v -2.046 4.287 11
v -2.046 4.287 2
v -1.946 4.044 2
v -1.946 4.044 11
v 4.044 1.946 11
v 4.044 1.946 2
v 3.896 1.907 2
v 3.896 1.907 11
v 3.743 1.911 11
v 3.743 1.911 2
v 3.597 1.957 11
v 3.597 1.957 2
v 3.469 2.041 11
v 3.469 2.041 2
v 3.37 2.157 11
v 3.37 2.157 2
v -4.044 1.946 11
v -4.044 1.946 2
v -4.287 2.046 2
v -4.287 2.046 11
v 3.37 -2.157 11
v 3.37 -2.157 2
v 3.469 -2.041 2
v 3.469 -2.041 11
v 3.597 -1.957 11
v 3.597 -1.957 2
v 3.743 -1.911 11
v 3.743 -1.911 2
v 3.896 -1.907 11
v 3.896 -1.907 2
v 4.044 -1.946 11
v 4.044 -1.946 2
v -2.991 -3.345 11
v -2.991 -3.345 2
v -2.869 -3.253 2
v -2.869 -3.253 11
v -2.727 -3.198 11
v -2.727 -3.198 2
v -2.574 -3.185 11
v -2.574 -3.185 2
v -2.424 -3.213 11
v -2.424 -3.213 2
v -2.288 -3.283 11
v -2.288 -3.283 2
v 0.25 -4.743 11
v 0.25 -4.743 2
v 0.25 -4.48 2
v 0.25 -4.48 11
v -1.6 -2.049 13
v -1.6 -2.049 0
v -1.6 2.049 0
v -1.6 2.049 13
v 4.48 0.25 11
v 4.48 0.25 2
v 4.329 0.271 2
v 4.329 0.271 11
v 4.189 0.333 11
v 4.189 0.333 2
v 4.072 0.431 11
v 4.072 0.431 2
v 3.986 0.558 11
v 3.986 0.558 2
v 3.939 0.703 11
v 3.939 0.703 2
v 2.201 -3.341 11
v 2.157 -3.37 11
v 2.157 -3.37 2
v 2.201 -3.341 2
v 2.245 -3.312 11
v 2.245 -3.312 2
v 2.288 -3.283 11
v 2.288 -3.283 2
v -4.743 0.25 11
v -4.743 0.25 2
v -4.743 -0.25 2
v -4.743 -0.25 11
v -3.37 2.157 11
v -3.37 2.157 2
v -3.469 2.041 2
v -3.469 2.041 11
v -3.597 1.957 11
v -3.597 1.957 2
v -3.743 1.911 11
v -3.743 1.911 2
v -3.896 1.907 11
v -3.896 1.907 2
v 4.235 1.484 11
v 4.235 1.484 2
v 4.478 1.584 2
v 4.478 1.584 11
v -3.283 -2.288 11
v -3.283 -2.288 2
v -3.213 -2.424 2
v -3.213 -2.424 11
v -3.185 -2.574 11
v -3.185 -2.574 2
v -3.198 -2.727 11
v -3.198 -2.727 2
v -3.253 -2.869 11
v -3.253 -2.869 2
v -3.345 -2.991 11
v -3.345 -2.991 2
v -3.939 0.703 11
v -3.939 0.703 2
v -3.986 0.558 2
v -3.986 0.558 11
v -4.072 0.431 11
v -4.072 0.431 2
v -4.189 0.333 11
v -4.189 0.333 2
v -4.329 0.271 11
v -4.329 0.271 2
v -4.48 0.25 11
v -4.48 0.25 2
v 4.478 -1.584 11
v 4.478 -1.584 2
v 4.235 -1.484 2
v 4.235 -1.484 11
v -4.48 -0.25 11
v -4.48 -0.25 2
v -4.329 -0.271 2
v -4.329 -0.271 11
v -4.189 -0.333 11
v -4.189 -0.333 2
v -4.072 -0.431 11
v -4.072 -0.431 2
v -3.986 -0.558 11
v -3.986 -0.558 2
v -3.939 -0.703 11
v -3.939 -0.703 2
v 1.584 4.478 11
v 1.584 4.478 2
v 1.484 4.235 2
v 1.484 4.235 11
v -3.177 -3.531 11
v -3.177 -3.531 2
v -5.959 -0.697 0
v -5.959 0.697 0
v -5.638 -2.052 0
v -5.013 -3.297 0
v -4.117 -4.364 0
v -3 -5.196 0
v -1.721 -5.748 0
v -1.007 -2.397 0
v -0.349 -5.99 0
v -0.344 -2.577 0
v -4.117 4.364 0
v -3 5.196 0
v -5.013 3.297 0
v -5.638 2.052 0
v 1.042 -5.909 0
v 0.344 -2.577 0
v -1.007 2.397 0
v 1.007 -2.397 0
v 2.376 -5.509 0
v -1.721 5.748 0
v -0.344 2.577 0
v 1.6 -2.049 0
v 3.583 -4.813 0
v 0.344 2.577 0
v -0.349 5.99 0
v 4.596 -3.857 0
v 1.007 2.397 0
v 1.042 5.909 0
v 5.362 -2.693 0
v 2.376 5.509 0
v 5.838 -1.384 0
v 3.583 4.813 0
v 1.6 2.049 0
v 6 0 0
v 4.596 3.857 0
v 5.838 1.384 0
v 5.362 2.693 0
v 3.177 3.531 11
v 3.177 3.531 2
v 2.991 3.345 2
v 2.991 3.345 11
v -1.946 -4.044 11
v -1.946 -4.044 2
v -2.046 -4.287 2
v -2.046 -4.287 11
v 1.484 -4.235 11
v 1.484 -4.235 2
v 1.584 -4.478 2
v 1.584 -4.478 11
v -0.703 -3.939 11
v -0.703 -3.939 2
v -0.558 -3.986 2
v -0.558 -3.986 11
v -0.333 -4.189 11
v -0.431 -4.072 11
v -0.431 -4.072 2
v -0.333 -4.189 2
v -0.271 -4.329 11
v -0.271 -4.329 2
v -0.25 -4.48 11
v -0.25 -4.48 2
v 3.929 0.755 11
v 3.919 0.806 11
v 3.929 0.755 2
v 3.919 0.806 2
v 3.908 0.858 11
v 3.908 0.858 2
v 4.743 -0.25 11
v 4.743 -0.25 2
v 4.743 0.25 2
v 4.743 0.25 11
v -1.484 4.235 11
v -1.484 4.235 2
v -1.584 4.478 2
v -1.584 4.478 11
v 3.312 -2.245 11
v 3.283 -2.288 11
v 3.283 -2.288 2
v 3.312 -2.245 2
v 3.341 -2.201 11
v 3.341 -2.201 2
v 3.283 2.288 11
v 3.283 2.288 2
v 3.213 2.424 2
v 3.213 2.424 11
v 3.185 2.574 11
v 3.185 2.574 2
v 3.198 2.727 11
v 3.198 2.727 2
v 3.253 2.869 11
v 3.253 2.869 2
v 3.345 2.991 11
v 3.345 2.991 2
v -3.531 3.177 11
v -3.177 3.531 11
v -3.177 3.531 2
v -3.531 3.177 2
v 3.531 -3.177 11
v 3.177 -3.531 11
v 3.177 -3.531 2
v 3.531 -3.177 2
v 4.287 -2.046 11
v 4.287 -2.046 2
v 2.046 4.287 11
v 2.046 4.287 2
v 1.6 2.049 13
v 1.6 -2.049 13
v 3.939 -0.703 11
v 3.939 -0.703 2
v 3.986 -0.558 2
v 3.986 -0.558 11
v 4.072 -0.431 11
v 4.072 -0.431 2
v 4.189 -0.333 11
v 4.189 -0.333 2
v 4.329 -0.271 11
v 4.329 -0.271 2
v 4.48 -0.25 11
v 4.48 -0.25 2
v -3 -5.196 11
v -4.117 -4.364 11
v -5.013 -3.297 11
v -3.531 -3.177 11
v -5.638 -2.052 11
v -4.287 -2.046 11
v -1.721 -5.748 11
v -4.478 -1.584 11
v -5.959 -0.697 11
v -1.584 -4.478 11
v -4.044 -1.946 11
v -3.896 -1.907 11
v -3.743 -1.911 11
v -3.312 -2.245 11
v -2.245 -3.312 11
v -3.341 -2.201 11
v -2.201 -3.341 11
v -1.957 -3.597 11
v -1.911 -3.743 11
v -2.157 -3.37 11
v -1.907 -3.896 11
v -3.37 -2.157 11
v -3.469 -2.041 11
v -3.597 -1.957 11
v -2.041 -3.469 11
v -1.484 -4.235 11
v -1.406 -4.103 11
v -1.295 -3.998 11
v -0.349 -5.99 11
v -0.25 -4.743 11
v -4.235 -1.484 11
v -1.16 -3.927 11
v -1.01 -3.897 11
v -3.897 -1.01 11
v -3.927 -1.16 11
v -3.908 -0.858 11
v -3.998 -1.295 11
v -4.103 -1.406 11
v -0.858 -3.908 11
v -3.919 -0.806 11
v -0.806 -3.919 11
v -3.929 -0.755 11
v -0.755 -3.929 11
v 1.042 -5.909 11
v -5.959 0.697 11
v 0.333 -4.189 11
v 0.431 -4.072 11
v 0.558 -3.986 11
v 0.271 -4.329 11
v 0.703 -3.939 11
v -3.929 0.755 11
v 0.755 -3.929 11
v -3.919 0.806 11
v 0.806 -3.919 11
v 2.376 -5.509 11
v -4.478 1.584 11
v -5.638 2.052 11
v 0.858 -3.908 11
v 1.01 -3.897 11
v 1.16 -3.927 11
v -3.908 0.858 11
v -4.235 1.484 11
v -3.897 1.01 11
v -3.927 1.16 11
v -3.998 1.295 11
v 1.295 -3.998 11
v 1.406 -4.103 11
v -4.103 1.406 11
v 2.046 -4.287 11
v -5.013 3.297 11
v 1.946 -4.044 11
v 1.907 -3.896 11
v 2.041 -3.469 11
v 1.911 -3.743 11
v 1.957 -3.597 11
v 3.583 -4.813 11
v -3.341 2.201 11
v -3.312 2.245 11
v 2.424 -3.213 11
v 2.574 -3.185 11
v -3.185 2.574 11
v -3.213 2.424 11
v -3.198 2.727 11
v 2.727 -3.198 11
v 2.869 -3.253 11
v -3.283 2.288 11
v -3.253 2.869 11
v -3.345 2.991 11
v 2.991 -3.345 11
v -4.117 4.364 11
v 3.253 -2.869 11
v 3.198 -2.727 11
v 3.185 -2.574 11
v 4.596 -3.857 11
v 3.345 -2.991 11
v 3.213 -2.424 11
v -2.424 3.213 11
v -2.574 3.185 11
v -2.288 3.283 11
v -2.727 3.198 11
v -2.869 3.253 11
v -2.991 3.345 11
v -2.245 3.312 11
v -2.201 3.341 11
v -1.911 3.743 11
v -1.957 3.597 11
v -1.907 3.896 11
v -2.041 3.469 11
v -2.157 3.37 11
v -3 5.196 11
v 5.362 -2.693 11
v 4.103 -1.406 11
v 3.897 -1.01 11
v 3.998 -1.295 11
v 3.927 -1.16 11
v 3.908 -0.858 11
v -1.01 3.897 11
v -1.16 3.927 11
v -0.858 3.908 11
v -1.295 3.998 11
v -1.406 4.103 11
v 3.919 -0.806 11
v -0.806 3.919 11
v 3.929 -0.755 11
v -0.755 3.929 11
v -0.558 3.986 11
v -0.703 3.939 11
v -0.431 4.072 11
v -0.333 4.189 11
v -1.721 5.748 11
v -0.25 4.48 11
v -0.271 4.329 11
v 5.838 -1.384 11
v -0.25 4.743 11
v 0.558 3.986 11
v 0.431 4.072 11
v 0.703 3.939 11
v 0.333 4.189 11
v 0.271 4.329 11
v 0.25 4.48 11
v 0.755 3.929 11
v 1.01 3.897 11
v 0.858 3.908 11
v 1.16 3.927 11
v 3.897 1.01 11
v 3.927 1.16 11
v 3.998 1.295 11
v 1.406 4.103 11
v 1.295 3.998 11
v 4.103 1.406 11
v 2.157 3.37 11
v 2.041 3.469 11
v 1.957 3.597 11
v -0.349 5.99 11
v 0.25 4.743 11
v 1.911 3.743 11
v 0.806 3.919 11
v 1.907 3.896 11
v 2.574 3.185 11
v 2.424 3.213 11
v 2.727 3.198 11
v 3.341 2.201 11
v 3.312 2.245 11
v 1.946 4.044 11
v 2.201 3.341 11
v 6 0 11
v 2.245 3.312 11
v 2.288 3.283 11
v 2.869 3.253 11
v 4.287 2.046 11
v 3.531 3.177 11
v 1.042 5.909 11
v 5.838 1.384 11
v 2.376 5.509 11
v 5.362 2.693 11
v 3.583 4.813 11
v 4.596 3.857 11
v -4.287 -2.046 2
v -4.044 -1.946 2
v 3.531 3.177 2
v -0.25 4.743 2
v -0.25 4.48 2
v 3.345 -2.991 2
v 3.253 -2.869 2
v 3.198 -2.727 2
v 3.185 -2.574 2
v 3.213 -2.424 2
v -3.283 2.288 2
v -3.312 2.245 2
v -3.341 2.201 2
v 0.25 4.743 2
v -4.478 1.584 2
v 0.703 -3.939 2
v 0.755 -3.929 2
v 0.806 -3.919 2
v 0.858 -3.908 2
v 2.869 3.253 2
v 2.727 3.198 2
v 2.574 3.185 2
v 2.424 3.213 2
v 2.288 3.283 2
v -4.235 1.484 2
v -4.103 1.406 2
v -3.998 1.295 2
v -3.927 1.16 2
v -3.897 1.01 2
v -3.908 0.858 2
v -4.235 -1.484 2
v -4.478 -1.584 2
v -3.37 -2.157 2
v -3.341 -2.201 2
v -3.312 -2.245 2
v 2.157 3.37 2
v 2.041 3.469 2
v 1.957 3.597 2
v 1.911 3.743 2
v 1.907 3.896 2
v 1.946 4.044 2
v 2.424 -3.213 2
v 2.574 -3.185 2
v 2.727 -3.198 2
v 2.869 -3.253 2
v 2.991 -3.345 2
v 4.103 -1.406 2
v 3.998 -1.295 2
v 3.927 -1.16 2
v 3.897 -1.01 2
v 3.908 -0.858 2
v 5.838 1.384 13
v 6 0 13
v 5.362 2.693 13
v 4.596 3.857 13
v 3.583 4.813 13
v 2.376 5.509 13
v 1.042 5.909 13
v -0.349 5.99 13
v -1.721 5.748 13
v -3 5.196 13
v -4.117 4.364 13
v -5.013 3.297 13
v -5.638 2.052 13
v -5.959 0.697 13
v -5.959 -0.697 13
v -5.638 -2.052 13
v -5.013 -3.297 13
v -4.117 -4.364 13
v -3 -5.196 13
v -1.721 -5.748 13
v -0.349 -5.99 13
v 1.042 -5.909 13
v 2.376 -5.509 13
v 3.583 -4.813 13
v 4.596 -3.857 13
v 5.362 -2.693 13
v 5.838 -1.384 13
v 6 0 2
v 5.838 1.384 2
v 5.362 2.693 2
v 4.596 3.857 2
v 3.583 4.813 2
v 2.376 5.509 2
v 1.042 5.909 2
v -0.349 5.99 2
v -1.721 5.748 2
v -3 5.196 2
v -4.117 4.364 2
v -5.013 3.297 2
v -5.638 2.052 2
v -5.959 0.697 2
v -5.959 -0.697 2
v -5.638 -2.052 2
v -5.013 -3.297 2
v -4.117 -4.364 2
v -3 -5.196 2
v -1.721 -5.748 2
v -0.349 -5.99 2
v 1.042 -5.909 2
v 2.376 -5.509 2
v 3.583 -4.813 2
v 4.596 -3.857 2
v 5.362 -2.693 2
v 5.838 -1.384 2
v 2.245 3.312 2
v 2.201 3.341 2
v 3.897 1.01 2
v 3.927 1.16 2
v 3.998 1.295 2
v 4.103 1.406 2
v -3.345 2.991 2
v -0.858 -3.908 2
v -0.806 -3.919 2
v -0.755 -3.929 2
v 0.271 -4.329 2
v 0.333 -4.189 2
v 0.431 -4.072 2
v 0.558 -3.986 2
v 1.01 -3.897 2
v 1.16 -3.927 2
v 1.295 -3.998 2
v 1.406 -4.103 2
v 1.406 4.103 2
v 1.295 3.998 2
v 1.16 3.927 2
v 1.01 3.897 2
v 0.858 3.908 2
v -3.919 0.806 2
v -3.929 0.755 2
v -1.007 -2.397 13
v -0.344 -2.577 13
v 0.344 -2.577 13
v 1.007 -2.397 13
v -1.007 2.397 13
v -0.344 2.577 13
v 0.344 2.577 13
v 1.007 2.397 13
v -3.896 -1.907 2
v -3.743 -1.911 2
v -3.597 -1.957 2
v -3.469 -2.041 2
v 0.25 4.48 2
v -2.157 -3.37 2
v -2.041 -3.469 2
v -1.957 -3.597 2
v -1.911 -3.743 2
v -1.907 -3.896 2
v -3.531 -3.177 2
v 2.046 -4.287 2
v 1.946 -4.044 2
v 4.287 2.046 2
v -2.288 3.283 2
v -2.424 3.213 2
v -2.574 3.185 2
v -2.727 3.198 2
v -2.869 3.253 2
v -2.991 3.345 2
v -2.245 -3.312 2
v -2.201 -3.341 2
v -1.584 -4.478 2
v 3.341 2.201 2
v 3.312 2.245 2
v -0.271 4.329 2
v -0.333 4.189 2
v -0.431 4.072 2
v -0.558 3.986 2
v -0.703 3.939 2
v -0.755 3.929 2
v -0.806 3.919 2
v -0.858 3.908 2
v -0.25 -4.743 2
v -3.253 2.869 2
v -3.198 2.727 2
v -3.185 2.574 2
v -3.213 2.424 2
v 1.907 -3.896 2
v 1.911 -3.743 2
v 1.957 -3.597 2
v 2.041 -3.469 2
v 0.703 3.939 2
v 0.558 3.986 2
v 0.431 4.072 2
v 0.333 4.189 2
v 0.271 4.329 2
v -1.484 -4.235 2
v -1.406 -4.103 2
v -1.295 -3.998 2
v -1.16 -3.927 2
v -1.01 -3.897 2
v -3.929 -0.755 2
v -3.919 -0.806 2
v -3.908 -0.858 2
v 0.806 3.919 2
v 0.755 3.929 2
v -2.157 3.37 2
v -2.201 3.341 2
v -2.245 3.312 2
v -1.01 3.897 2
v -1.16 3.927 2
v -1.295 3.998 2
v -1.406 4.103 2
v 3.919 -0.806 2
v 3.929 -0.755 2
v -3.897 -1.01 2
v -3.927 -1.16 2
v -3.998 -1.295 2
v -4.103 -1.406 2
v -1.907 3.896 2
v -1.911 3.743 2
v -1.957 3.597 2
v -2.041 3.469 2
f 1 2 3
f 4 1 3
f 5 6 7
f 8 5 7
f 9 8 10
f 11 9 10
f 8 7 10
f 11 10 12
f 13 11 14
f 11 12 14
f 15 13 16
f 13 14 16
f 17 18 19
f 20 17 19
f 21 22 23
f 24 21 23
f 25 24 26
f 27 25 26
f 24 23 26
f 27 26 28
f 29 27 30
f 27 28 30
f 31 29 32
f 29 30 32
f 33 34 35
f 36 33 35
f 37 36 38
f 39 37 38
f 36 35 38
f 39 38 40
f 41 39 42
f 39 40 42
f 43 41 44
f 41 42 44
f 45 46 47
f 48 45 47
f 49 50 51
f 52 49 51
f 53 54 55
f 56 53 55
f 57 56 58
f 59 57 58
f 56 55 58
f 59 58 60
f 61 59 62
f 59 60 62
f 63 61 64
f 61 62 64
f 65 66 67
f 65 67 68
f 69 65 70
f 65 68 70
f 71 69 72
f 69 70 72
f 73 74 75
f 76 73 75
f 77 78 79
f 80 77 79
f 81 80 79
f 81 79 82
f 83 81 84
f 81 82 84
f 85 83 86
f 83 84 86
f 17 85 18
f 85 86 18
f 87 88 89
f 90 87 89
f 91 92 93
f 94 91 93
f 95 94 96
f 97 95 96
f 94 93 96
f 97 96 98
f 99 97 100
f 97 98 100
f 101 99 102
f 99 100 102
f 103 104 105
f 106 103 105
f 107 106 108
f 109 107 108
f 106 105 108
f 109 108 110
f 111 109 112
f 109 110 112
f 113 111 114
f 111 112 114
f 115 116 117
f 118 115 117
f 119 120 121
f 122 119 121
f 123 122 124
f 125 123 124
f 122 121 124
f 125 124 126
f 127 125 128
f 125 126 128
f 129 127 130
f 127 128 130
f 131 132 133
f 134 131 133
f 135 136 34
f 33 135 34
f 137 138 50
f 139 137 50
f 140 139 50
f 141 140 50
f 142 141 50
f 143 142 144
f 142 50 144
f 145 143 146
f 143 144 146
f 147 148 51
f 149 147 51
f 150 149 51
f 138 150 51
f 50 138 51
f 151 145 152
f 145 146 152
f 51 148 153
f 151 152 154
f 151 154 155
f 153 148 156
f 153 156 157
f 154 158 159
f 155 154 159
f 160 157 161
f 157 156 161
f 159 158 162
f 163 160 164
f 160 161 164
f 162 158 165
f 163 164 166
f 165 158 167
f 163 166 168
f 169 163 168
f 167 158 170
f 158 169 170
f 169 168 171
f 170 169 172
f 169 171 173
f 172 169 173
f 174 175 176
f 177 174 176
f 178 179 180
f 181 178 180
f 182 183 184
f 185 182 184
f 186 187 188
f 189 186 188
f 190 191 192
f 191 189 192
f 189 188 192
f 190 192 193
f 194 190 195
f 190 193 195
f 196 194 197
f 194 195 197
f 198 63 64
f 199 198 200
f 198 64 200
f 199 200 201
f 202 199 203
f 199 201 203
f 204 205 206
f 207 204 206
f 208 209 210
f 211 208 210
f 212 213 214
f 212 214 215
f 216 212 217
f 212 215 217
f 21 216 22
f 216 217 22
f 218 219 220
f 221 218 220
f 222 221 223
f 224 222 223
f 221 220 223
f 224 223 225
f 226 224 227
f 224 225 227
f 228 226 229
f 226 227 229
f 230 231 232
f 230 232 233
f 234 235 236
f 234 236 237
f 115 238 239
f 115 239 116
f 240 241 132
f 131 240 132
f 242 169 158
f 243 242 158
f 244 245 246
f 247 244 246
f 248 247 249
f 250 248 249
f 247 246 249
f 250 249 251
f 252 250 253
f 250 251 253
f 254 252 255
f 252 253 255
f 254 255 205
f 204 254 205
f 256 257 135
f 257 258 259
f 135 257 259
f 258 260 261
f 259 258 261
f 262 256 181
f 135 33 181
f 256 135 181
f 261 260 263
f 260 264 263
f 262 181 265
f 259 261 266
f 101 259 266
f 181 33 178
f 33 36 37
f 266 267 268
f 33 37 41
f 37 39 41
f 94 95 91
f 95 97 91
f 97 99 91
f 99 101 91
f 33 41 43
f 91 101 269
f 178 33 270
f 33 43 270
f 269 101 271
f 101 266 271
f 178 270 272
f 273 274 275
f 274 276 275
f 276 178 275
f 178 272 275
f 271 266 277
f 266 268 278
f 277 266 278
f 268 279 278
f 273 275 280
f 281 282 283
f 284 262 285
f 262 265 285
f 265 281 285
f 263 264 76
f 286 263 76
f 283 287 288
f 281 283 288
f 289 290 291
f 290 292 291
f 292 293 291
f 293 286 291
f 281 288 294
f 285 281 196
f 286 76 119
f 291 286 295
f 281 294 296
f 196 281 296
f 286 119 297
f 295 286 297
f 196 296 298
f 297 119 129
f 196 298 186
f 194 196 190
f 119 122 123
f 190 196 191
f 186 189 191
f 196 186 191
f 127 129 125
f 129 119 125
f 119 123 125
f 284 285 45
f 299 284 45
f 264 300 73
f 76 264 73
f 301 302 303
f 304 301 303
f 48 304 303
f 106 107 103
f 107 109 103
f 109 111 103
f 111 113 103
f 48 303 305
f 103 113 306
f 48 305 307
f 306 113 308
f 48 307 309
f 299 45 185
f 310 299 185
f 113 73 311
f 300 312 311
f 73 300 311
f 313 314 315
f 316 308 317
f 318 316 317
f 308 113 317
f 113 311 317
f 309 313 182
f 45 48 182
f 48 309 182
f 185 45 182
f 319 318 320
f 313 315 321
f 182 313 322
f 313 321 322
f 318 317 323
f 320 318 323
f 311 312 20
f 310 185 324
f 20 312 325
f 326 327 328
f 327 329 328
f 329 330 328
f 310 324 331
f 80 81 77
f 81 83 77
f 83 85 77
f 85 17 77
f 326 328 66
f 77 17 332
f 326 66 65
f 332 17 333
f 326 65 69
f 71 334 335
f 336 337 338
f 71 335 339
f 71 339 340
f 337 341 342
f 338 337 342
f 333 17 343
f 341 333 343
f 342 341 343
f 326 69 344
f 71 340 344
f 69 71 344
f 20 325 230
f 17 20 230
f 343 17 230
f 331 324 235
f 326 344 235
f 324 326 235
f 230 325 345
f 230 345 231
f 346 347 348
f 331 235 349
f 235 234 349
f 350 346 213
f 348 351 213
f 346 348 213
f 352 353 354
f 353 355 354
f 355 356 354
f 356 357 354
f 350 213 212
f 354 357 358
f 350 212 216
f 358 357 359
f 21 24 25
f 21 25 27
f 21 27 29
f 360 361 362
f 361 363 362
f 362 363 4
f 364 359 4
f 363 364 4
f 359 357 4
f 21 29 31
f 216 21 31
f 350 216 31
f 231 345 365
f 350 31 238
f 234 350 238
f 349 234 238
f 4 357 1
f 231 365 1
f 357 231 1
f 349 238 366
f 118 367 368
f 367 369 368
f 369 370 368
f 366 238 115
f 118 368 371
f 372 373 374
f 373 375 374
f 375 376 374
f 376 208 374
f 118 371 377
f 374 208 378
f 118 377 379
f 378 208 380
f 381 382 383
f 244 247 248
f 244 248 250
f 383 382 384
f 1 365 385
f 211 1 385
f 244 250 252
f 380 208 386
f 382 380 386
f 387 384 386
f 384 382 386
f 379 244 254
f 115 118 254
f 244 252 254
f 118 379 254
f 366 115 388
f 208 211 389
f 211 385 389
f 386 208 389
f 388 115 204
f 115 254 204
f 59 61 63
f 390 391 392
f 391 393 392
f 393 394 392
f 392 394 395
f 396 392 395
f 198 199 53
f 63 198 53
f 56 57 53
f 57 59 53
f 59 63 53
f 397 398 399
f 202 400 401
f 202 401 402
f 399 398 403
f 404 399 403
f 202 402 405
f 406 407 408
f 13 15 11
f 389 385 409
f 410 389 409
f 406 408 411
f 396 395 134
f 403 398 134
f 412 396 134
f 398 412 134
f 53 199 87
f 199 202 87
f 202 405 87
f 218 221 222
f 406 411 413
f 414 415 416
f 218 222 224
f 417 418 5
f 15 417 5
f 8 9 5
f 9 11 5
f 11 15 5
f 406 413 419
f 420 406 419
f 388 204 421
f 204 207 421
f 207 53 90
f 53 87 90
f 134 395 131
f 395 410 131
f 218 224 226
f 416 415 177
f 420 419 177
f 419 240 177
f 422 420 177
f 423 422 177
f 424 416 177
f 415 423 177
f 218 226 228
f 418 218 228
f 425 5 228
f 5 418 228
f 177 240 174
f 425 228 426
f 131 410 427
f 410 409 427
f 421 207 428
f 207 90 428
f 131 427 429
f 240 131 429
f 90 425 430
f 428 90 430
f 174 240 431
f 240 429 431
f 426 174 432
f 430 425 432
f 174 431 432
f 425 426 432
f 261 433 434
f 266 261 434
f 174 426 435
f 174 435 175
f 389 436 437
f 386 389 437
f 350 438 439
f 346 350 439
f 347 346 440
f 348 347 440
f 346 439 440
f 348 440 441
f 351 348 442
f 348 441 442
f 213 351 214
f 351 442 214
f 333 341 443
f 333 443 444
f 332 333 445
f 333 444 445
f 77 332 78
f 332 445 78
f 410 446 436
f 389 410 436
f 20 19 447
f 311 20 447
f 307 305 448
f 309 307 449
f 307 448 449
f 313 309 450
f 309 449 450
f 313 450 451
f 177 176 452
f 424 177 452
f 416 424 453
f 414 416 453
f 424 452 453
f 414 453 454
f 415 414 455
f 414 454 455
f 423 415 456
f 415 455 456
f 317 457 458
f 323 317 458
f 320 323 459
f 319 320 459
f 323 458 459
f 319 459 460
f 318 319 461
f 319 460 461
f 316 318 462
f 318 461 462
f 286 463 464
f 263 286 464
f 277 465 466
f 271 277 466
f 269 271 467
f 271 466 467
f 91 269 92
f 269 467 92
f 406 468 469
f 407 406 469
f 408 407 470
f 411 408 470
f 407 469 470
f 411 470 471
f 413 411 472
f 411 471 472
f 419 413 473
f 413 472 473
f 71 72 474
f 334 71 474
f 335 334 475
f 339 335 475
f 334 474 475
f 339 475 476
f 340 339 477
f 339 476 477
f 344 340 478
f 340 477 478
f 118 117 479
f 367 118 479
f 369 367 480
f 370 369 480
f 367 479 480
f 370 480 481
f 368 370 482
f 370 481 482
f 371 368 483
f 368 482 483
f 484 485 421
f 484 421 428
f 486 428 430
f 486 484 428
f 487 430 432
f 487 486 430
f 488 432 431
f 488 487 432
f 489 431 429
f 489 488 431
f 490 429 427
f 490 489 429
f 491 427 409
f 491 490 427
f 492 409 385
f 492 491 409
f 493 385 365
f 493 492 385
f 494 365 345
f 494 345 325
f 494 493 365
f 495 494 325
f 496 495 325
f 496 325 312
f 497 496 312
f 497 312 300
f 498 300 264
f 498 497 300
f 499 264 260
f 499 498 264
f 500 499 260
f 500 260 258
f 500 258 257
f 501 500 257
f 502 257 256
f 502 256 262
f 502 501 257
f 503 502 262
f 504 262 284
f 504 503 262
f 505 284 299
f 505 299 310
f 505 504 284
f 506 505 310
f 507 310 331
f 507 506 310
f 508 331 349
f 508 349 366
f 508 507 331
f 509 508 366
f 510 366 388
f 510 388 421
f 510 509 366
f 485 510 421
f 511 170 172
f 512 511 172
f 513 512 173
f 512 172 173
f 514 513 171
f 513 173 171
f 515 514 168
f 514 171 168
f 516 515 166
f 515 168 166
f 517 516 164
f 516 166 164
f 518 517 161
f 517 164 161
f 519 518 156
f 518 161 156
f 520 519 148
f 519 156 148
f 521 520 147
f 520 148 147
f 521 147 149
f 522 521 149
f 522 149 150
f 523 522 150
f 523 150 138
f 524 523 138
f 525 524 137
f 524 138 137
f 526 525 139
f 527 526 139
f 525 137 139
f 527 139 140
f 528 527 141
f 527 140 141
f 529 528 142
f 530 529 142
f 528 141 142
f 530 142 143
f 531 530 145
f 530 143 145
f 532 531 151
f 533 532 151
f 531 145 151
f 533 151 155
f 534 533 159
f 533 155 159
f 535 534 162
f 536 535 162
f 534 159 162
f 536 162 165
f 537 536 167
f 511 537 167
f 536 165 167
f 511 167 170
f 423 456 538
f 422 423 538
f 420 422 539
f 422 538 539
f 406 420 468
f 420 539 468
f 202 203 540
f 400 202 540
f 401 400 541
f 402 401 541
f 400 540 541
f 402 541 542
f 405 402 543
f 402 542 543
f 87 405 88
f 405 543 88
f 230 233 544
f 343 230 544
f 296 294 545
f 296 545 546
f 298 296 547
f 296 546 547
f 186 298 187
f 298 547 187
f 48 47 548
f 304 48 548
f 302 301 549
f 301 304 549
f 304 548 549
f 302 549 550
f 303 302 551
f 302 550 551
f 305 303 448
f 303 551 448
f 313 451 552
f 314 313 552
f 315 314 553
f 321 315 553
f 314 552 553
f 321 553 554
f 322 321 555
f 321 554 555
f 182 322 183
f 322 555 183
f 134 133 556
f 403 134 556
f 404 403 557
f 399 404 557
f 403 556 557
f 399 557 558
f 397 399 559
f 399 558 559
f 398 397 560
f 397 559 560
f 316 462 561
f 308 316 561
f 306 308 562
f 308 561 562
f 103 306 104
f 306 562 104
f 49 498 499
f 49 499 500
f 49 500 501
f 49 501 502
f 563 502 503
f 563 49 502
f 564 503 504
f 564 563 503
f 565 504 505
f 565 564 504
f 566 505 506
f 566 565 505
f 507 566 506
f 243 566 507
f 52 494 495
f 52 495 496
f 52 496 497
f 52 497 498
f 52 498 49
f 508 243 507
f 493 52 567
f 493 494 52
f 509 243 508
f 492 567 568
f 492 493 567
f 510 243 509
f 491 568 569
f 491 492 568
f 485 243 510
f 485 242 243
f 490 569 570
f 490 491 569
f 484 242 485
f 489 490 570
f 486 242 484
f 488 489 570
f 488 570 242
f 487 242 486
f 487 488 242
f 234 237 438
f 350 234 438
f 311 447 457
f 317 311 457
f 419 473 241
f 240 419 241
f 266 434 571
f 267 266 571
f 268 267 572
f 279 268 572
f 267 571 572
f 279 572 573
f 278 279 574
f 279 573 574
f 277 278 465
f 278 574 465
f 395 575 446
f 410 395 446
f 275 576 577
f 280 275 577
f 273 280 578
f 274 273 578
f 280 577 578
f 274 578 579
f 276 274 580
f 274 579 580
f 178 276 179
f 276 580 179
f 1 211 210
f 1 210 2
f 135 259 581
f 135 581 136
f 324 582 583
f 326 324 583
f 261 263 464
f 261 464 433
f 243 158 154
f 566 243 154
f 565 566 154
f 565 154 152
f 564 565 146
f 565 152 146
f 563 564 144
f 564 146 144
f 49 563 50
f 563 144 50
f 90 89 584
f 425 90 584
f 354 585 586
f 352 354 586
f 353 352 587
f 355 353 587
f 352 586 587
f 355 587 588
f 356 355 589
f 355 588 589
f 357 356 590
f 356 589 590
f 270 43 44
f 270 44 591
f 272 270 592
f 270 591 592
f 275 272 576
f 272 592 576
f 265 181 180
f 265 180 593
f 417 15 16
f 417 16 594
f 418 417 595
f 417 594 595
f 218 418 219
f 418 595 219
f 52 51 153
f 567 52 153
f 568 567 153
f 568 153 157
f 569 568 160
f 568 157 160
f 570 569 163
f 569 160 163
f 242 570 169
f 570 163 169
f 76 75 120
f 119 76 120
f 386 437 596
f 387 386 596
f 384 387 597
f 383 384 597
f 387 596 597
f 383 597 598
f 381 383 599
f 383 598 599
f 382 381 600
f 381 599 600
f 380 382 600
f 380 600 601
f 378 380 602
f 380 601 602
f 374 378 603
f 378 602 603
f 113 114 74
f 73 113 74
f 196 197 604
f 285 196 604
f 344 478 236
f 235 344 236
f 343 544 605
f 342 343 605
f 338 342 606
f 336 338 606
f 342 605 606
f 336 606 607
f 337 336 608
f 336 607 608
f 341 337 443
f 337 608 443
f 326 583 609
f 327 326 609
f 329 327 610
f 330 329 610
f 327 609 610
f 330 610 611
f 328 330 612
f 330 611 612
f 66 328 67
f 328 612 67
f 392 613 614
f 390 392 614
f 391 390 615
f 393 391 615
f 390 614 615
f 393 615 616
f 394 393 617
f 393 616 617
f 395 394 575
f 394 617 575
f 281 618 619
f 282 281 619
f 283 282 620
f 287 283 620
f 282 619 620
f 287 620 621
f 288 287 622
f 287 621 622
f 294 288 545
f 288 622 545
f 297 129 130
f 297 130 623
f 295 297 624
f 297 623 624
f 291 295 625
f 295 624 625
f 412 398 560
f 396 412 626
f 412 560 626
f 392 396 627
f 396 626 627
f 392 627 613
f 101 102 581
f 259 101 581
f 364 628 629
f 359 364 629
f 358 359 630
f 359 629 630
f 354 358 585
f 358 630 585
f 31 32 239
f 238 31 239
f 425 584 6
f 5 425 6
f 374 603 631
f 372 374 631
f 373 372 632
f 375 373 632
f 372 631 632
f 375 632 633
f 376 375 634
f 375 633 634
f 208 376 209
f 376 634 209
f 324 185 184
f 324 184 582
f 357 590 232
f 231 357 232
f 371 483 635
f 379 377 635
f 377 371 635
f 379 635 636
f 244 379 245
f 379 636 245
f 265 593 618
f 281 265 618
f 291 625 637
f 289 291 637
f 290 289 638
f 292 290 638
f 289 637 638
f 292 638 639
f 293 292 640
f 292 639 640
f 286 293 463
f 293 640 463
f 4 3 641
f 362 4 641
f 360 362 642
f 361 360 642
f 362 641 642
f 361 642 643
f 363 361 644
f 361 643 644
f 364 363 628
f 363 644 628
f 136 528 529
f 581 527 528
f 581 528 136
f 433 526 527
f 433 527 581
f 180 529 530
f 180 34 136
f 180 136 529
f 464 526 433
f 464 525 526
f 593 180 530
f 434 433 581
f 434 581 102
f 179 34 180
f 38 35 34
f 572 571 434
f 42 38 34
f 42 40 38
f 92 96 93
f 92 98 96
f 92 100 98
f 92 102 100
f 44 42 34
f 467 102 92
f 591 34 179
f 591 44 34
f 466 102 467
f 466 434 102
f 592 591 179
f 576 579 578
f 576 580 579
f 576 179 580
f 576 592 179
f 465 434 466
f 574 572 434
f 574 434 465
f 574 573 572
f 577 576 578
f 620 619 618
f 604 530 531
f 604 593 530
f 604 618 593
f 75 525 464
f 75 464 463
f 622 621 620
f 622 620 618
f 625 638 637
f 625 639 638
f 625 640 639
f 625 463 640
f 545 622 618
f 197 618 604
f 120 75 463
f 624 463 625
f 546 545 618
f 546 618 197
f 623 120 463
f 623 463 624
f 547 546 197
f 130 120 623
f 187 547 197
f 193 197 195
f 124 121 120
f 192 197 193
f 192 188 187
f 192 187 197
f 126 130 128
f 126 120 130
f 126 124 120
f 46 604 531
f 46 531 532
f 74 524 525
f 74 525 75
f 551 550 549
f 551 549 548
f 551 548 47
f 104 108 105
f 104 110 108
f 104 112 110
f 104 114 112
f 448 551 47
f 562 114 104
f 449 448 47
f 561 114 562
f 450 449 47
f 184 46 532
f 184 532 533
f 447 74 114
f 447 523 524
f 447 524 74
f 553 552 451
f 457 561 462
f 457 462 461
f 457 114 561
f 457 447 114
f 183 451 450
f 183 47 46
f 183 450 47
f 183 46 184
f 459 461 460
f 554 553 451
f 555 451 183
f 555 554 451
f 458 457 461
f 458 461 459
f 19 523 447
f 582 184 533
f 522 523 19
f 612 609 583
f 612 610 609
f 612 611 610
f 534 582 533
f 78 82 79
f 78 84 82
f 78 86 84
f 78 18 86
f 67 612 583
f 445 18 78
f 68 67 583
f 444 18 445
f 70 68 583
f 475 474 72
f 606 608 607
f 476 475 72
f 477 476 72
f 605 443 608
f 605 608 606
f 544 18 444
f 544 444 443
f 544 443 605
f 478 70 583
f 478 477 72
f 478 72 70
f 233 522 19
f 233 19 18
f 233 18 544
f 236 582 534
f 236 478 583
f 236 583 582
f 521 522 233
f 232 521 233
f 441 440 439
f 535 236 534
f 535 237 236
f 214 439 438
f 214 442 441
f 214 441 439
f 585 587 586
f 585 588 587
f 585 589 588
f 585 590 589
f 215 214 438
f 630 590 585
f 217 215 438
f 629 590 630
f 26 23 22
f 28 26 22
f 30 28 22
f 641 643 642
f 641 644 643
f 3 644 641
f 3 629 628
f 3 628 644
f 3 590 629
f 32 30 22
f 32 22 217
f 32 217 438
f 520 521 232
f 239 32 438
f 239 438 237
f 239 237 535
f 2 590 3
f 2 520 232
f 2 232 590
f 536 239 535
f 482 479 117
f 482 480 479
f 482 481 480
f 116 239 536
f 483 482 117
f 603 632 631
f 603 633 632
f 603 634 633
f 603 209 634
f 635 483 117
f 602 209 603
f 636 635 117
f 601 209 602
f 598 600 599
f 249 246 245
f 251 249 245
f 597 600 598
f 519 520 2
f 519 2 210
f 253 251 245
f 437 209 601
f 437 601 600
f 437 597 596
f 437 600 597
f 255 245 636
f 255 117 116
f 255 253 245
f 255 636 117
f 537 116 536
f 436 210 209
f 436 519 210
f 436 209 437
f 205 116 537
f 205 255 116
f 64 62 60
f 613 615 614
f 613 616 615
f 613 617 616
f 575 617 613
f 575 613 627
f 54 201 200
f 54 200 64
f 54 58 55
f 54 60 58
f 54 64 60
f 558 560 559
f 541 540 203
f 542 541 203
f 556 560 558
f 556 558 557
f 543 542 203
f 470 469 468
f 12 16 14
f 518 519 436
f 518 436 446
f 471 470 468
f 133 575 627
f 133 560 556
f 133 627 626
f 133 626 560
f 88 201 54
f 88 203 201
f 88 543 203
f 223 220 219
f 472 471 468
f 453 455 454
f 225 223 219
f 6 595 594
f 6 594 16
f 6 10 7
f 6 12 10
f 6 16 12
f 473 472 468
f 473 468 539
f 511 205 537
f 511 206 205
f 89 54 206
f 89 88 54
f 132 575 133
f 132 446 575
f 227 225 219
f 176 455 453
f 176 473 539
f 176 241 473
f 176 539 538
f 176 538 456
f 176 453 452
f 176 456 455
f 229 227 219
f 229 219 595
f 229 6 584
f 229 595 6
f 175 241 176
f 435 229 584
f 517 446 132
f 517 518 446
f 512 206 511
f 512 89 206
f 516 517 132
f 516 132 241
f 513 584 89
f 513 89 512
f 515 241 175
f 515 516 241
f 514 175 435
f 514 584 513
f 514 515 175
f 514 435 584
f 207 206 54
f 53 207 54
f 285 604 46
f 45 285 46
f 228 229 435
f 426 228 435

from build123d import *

# Parameters (mm, degrees)
F2_DEPTH        = 13
F1_R            = 6
F3_DEPTH        = 2
F4_DEPTH        = 13
F4_COPIES_COUNT = 16


# Not quite as in the source:
# - a pattern or mirror of a feature is missing from the dataset's text; its kind, count and spacing are read off the source's solid


with BuildPart() as f2:
    # F1 (on Top) → F2 (new body)
    with BuildSketch(Plane.XY):
        with BuildLine():
            ThreePointArc((-0.7033229276, -3.9389354049), (-0.4774392089, -3.9726473625), (-0.25, -3.9934164903))
            Line((-0.25, -3.9934164903), (0.25, -3.9934164903))
            Line((0.25, -3.9934164903), (0.7033229276, -3.9389354049))
            ThreePointArc((0.7033229276, -3.9389354049), (0, 4.0012342177), (-0.7033229276, -3.9389354049))
        make_face()
        with BuildLine():
            ThreePointArc((1.6, 2.0493901532), (2.3366642891, 1.1401754251), (2.6, 0))
            ThreePointArc((2.6, 0), (2.3366642891, -1.1401754251), (1.6, -2.0493901532))
            ThreePointArc((1.6, -2.0493901532), (0, -2.6), (-1.6, -2.0493901532))
            ThreePointArc((-1.6, -2.0493901532), (-2.6, 0), (-1.6, 2.0493901532))
            ThreePointArc((-1.6, 2.0493901532), (0, 2.6), (1.6, 2.0493901532))
        make_face(mode=Mode.SUBTRACT)
        with BuildLine():
            ThreePointArc((1.6, -2.0493901532), (2.3366642891, -1.1401754251), (2.6, 0))
            ThreePointArc((2.6, 0), (2.3366642891, 1.1401754251), (1.6, 2.0493901532))
            Line((1.6, 2.0493901532), (1.6, -2.0493901532))
        make_face()
        with BuildLine():
            Line((-1.6, -2.0493901532), (-1.6, 2.0493901532))
            ThreePointArc((-1.6, 2.0493901532), (-2.6, 0), (-1.6, -2.0493901532))
        make_face()
    extrude(amount=F2_DEPTH)

    # F1 (on Top) → F3 (join)
    with BuildSketch(Plane.XY):
        Circle(F1_R)
        with BuildLine():
            ThreePointArc((-0.25, -4.4803719605), (-0.3782937101, -4.1272943414), (-0.7033229276, -3.9389354049))
            ThreePointArc((-0.7033229276, -3.9389354049), (0, 4.0012342177), (0.7033229276, -3.9389354049))
            ThreePointArc((0.7033229276, -3.9389354049), (0.3782937101, -4.1272943414), (0.25, -4.4803719605))
            Line((0.25, -4.4803719605), (0.25, -4.7434164903))
            Line((0.25, -4.7434164903), (-0.25, -4.7434164903))
            Line((-0.25, -4.7434164903), (-0.25, -4.4803719605))
        make_face(mode=Mode.SUBTRACT)
    f3 = extrude(amount=F3_DEPTH)

    # F3_copies: F3 across plane
    add(f3.mirror(Plane.XY.offset(6.5)))

    # F1 (on Top) → F4 (join)
    with BuildSketch(Plane.XY):
        with BuildLine():
            Line((0.25, -3.9934164903), (-0.25, -3.9934164903))
            ThreePointArc((-0.25, -3.9934164903), (-0.4774392089, -3.9726473625), (-0.7033229276, -3.9389354049))
            ThreePointArc((-0.7033229276, -3.9389354049), (-0.3782937101, -4.1272943414), (-0.25, -4.4803719605))
            Line((-0.25, -4.4803719605), (-0.25, -4.7434164903))
            Line((-0.25, -4.7434164903), (0.25, -4.7434164903))
            Line((0.25, -4.7434164903), (0.25, -4.4803719605))
            ThreePointArc((0.25, -4.4803719605), (0.3782937101, -4.1272943414), (0.7033229276, -3.9389354049))
            Line((0.7033229276, -3.9389354049), (0.25, -3.9934164903))
        make_face()
    f4 = extrude(amount=F4_DEPTH)

    # F4_copies: F4 ×16 about axis
    f4_copies_axis = Axis((0, 0, 0), (0, 0, 1))
    for i in range(1, F4_COPIES_COUNT):
        add(f4.rotate(f4_copies_axis, i * 360 / F4_COPIES_COUNT))


solid = f2.part
